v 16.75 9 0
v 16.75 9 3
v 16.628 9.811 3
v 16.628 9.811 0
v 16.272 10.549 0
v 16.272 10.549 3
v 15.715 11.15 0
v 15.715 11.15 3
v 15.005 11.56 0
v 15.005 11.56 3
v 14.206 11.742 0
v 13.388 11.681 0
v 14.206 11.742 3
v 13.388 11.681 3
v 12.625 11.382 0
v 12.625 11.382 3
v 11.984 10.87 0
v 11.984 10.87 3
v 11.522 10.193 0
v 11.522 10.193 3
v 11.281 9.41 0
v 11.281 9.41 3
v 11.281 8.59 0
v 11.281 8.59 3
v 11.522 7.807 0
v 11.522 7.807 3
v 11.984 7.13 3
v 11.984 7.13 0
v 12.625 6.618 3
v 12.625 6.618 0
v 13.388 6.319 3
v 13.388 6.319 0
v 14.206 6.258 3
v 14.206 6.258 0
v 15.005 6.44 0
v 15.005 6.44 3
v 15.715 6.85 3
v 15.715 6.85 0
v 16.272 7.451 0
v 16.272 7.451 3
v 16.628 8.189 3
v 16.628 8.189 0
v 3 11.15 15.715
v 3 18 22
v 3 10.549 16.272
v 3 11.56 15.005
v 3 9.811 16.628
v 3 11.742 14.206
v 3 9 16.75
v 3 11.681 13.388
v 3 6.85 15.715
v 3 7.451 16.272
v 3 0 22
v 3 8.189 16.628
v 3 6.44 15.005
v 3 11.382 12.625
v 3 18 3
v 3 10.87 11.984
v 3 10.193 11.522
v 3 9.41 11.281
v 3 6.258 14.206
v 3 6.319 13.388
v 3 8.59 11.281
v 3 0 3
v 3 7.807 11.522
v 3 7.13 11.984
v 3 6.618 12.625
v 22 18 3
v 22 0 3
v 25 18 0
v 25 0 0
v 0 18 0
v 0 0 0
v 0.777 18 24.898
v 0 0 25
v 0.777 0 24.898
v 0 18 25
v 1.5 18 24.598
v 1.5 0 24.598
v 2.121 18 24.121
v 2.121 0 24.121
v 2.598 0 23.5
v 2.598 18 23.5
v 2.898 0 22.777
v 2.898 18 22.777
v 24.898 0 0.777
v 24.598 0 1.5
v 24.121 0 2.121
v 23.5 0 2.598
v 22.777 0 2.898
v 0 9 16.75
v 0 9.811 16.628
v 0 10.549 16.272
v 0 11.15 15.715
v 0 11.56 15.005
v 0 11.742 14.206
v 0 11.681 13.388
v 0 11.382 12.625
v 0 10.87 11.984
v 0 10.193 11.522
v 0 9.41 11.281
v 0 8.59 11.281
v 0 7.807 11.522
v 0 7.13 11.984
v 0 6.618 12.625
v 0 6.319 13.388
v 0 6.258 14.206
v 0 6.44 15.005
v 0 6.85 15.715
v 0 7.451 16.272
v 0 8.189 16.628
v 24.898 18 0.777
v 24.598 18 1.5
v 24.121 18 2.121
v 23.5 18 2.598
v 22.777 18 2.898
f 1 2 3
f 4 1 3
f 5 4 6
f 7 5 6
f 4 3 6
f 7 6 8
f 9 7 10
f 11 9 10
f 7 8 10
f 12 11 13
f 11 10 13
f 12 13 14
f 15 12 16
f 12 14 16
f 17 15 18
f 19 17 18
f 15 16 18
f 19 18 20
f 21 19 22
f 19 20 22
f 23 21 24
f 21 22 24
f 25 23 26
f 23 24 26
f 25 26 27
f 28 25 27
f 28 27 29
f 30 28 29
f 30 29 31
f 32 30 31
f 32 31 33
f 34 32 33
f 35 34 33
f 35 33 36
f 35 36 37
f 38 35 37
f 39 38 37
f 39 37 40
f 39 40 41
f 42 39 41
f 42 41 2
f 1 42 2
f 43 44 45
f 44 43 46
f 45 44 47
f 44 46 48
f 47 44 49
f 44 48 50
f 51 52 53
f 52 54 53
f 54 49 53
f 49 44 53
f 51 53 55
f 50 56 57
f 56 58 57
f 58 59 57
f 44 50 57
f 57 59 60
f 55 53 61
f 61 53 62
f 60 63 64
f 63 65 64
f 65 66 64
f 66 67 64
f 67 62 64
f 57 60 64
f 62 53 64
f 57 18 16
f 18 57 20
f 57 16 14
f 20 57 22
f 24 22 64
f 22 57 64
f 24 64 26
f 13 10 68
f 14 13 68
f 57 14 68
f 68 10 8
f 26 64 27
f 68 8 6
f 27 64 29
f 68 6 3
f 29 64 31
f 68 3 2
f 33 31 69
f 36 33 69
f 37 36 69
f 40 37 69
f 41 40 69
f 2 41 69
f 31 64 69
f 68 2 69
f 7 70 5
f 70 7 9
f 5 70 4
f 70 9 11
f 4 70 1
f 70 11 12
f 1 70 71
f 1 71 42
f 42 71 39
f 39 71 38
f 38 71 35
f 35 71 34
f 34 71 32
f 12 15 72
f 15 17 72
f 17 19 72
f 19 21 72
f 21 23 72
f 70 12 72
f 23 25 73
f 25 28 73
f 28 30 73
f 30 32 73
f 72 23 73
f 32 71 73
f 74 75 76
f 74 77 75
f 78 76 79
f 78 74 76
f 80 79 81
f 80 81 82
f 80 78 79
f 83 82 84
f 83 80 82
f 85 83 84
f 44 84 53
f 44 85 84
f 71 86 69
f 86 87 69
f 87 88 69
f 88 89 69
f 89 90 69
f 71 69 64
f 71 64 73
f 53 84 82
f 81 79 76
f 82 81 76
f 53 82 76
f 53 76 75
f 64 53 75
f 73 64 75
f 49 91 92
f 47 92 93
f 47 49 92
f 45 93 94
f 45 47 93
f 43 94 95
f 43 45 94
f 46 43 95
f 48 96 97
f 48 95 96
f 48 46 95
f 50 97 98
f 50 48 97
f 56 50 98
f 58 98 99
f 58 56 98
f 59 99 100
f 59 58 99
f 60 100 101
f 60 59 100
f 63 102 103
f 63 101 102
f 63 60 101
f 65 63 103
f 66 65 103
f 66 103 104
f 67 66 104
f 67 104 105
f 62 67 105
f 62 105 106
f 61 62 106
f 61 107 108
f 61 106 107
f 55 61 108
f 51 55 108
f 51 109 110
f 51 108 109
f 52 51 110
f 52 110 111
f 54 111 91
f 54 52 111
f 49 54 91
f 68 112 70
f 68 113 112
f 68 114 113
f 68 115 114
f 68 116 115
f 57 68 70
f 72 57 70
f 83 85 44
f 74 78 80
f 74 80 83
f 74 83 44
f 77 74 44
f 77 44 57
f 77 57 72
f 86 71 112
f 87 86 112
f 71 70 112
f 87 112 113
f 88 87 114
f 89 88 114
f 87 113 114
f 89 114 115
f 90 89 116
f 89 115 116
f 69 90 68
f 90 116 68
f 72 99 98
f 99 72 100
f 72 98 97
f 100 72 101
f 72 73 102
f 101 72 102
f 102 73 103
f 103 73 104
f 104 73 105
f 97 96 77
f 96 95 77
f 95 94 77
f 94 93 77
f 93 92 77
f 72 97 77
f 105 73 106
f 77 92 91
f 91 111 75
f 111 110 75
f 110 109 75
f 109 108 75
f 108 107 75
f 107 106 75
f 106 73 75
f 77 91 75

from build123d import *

# Parameters (mm, degrees)
BOSS_EXTRUDE1_DEPTH = 18
SKETCH3_R           = 2.75
CUT_EXTRUDE2_DEPTH  = 38.854986461
FILLET1_R           = 3


with BuildPart() as part:
    # Sketch2 → Boss-Extrude1 (new body)
    with BuildSketch(Plane(origin=(0, 0, 0), x_dir=(-1, 0, 0), z_dir=(0, 1, 0))):
        Polygon((0, 0), (0, 25), (-3, 25), (-3, 3), (-25, 3), (-25, 0), align=None)
    extrude(amount=BOSS_EXTRUDE1_DEPTH)

    # Sketch3 → Cut-Extrude2 (cut, through all)
    with BuildSketch(Plane.XY.offset(3)):
        with Locations((14, 9)):
            Circle(SKETCH3_R)
    cut_extrude2 = extrude(amount=-CUT_EXTRUDE2_DEPTH, mode=Mode.SUBTRACT)

    # Mirror1: Cut-Extrude2 across plane
    add(cut_extrude2.mirror(Plane(origin=(0, 0, 0), x_dir=(0.7071067811865465, 0, 0.7071067811865486), z_dir=(-0.7071067811865488, 0, 0.7071067811865464))), mode=Mode.SUBTRACT)

    # Fillet1
    fillet1_edges = [part.edges().sort_by_distance(p)[0] for p in [
        (3, 9, 25),
        (25, 9, 3),
    ]]
    fillet(fillet1_edges, radius=FILLET1_R - 0.0001)  # a hair under: the kernel refuses the full size


solid = part.part
